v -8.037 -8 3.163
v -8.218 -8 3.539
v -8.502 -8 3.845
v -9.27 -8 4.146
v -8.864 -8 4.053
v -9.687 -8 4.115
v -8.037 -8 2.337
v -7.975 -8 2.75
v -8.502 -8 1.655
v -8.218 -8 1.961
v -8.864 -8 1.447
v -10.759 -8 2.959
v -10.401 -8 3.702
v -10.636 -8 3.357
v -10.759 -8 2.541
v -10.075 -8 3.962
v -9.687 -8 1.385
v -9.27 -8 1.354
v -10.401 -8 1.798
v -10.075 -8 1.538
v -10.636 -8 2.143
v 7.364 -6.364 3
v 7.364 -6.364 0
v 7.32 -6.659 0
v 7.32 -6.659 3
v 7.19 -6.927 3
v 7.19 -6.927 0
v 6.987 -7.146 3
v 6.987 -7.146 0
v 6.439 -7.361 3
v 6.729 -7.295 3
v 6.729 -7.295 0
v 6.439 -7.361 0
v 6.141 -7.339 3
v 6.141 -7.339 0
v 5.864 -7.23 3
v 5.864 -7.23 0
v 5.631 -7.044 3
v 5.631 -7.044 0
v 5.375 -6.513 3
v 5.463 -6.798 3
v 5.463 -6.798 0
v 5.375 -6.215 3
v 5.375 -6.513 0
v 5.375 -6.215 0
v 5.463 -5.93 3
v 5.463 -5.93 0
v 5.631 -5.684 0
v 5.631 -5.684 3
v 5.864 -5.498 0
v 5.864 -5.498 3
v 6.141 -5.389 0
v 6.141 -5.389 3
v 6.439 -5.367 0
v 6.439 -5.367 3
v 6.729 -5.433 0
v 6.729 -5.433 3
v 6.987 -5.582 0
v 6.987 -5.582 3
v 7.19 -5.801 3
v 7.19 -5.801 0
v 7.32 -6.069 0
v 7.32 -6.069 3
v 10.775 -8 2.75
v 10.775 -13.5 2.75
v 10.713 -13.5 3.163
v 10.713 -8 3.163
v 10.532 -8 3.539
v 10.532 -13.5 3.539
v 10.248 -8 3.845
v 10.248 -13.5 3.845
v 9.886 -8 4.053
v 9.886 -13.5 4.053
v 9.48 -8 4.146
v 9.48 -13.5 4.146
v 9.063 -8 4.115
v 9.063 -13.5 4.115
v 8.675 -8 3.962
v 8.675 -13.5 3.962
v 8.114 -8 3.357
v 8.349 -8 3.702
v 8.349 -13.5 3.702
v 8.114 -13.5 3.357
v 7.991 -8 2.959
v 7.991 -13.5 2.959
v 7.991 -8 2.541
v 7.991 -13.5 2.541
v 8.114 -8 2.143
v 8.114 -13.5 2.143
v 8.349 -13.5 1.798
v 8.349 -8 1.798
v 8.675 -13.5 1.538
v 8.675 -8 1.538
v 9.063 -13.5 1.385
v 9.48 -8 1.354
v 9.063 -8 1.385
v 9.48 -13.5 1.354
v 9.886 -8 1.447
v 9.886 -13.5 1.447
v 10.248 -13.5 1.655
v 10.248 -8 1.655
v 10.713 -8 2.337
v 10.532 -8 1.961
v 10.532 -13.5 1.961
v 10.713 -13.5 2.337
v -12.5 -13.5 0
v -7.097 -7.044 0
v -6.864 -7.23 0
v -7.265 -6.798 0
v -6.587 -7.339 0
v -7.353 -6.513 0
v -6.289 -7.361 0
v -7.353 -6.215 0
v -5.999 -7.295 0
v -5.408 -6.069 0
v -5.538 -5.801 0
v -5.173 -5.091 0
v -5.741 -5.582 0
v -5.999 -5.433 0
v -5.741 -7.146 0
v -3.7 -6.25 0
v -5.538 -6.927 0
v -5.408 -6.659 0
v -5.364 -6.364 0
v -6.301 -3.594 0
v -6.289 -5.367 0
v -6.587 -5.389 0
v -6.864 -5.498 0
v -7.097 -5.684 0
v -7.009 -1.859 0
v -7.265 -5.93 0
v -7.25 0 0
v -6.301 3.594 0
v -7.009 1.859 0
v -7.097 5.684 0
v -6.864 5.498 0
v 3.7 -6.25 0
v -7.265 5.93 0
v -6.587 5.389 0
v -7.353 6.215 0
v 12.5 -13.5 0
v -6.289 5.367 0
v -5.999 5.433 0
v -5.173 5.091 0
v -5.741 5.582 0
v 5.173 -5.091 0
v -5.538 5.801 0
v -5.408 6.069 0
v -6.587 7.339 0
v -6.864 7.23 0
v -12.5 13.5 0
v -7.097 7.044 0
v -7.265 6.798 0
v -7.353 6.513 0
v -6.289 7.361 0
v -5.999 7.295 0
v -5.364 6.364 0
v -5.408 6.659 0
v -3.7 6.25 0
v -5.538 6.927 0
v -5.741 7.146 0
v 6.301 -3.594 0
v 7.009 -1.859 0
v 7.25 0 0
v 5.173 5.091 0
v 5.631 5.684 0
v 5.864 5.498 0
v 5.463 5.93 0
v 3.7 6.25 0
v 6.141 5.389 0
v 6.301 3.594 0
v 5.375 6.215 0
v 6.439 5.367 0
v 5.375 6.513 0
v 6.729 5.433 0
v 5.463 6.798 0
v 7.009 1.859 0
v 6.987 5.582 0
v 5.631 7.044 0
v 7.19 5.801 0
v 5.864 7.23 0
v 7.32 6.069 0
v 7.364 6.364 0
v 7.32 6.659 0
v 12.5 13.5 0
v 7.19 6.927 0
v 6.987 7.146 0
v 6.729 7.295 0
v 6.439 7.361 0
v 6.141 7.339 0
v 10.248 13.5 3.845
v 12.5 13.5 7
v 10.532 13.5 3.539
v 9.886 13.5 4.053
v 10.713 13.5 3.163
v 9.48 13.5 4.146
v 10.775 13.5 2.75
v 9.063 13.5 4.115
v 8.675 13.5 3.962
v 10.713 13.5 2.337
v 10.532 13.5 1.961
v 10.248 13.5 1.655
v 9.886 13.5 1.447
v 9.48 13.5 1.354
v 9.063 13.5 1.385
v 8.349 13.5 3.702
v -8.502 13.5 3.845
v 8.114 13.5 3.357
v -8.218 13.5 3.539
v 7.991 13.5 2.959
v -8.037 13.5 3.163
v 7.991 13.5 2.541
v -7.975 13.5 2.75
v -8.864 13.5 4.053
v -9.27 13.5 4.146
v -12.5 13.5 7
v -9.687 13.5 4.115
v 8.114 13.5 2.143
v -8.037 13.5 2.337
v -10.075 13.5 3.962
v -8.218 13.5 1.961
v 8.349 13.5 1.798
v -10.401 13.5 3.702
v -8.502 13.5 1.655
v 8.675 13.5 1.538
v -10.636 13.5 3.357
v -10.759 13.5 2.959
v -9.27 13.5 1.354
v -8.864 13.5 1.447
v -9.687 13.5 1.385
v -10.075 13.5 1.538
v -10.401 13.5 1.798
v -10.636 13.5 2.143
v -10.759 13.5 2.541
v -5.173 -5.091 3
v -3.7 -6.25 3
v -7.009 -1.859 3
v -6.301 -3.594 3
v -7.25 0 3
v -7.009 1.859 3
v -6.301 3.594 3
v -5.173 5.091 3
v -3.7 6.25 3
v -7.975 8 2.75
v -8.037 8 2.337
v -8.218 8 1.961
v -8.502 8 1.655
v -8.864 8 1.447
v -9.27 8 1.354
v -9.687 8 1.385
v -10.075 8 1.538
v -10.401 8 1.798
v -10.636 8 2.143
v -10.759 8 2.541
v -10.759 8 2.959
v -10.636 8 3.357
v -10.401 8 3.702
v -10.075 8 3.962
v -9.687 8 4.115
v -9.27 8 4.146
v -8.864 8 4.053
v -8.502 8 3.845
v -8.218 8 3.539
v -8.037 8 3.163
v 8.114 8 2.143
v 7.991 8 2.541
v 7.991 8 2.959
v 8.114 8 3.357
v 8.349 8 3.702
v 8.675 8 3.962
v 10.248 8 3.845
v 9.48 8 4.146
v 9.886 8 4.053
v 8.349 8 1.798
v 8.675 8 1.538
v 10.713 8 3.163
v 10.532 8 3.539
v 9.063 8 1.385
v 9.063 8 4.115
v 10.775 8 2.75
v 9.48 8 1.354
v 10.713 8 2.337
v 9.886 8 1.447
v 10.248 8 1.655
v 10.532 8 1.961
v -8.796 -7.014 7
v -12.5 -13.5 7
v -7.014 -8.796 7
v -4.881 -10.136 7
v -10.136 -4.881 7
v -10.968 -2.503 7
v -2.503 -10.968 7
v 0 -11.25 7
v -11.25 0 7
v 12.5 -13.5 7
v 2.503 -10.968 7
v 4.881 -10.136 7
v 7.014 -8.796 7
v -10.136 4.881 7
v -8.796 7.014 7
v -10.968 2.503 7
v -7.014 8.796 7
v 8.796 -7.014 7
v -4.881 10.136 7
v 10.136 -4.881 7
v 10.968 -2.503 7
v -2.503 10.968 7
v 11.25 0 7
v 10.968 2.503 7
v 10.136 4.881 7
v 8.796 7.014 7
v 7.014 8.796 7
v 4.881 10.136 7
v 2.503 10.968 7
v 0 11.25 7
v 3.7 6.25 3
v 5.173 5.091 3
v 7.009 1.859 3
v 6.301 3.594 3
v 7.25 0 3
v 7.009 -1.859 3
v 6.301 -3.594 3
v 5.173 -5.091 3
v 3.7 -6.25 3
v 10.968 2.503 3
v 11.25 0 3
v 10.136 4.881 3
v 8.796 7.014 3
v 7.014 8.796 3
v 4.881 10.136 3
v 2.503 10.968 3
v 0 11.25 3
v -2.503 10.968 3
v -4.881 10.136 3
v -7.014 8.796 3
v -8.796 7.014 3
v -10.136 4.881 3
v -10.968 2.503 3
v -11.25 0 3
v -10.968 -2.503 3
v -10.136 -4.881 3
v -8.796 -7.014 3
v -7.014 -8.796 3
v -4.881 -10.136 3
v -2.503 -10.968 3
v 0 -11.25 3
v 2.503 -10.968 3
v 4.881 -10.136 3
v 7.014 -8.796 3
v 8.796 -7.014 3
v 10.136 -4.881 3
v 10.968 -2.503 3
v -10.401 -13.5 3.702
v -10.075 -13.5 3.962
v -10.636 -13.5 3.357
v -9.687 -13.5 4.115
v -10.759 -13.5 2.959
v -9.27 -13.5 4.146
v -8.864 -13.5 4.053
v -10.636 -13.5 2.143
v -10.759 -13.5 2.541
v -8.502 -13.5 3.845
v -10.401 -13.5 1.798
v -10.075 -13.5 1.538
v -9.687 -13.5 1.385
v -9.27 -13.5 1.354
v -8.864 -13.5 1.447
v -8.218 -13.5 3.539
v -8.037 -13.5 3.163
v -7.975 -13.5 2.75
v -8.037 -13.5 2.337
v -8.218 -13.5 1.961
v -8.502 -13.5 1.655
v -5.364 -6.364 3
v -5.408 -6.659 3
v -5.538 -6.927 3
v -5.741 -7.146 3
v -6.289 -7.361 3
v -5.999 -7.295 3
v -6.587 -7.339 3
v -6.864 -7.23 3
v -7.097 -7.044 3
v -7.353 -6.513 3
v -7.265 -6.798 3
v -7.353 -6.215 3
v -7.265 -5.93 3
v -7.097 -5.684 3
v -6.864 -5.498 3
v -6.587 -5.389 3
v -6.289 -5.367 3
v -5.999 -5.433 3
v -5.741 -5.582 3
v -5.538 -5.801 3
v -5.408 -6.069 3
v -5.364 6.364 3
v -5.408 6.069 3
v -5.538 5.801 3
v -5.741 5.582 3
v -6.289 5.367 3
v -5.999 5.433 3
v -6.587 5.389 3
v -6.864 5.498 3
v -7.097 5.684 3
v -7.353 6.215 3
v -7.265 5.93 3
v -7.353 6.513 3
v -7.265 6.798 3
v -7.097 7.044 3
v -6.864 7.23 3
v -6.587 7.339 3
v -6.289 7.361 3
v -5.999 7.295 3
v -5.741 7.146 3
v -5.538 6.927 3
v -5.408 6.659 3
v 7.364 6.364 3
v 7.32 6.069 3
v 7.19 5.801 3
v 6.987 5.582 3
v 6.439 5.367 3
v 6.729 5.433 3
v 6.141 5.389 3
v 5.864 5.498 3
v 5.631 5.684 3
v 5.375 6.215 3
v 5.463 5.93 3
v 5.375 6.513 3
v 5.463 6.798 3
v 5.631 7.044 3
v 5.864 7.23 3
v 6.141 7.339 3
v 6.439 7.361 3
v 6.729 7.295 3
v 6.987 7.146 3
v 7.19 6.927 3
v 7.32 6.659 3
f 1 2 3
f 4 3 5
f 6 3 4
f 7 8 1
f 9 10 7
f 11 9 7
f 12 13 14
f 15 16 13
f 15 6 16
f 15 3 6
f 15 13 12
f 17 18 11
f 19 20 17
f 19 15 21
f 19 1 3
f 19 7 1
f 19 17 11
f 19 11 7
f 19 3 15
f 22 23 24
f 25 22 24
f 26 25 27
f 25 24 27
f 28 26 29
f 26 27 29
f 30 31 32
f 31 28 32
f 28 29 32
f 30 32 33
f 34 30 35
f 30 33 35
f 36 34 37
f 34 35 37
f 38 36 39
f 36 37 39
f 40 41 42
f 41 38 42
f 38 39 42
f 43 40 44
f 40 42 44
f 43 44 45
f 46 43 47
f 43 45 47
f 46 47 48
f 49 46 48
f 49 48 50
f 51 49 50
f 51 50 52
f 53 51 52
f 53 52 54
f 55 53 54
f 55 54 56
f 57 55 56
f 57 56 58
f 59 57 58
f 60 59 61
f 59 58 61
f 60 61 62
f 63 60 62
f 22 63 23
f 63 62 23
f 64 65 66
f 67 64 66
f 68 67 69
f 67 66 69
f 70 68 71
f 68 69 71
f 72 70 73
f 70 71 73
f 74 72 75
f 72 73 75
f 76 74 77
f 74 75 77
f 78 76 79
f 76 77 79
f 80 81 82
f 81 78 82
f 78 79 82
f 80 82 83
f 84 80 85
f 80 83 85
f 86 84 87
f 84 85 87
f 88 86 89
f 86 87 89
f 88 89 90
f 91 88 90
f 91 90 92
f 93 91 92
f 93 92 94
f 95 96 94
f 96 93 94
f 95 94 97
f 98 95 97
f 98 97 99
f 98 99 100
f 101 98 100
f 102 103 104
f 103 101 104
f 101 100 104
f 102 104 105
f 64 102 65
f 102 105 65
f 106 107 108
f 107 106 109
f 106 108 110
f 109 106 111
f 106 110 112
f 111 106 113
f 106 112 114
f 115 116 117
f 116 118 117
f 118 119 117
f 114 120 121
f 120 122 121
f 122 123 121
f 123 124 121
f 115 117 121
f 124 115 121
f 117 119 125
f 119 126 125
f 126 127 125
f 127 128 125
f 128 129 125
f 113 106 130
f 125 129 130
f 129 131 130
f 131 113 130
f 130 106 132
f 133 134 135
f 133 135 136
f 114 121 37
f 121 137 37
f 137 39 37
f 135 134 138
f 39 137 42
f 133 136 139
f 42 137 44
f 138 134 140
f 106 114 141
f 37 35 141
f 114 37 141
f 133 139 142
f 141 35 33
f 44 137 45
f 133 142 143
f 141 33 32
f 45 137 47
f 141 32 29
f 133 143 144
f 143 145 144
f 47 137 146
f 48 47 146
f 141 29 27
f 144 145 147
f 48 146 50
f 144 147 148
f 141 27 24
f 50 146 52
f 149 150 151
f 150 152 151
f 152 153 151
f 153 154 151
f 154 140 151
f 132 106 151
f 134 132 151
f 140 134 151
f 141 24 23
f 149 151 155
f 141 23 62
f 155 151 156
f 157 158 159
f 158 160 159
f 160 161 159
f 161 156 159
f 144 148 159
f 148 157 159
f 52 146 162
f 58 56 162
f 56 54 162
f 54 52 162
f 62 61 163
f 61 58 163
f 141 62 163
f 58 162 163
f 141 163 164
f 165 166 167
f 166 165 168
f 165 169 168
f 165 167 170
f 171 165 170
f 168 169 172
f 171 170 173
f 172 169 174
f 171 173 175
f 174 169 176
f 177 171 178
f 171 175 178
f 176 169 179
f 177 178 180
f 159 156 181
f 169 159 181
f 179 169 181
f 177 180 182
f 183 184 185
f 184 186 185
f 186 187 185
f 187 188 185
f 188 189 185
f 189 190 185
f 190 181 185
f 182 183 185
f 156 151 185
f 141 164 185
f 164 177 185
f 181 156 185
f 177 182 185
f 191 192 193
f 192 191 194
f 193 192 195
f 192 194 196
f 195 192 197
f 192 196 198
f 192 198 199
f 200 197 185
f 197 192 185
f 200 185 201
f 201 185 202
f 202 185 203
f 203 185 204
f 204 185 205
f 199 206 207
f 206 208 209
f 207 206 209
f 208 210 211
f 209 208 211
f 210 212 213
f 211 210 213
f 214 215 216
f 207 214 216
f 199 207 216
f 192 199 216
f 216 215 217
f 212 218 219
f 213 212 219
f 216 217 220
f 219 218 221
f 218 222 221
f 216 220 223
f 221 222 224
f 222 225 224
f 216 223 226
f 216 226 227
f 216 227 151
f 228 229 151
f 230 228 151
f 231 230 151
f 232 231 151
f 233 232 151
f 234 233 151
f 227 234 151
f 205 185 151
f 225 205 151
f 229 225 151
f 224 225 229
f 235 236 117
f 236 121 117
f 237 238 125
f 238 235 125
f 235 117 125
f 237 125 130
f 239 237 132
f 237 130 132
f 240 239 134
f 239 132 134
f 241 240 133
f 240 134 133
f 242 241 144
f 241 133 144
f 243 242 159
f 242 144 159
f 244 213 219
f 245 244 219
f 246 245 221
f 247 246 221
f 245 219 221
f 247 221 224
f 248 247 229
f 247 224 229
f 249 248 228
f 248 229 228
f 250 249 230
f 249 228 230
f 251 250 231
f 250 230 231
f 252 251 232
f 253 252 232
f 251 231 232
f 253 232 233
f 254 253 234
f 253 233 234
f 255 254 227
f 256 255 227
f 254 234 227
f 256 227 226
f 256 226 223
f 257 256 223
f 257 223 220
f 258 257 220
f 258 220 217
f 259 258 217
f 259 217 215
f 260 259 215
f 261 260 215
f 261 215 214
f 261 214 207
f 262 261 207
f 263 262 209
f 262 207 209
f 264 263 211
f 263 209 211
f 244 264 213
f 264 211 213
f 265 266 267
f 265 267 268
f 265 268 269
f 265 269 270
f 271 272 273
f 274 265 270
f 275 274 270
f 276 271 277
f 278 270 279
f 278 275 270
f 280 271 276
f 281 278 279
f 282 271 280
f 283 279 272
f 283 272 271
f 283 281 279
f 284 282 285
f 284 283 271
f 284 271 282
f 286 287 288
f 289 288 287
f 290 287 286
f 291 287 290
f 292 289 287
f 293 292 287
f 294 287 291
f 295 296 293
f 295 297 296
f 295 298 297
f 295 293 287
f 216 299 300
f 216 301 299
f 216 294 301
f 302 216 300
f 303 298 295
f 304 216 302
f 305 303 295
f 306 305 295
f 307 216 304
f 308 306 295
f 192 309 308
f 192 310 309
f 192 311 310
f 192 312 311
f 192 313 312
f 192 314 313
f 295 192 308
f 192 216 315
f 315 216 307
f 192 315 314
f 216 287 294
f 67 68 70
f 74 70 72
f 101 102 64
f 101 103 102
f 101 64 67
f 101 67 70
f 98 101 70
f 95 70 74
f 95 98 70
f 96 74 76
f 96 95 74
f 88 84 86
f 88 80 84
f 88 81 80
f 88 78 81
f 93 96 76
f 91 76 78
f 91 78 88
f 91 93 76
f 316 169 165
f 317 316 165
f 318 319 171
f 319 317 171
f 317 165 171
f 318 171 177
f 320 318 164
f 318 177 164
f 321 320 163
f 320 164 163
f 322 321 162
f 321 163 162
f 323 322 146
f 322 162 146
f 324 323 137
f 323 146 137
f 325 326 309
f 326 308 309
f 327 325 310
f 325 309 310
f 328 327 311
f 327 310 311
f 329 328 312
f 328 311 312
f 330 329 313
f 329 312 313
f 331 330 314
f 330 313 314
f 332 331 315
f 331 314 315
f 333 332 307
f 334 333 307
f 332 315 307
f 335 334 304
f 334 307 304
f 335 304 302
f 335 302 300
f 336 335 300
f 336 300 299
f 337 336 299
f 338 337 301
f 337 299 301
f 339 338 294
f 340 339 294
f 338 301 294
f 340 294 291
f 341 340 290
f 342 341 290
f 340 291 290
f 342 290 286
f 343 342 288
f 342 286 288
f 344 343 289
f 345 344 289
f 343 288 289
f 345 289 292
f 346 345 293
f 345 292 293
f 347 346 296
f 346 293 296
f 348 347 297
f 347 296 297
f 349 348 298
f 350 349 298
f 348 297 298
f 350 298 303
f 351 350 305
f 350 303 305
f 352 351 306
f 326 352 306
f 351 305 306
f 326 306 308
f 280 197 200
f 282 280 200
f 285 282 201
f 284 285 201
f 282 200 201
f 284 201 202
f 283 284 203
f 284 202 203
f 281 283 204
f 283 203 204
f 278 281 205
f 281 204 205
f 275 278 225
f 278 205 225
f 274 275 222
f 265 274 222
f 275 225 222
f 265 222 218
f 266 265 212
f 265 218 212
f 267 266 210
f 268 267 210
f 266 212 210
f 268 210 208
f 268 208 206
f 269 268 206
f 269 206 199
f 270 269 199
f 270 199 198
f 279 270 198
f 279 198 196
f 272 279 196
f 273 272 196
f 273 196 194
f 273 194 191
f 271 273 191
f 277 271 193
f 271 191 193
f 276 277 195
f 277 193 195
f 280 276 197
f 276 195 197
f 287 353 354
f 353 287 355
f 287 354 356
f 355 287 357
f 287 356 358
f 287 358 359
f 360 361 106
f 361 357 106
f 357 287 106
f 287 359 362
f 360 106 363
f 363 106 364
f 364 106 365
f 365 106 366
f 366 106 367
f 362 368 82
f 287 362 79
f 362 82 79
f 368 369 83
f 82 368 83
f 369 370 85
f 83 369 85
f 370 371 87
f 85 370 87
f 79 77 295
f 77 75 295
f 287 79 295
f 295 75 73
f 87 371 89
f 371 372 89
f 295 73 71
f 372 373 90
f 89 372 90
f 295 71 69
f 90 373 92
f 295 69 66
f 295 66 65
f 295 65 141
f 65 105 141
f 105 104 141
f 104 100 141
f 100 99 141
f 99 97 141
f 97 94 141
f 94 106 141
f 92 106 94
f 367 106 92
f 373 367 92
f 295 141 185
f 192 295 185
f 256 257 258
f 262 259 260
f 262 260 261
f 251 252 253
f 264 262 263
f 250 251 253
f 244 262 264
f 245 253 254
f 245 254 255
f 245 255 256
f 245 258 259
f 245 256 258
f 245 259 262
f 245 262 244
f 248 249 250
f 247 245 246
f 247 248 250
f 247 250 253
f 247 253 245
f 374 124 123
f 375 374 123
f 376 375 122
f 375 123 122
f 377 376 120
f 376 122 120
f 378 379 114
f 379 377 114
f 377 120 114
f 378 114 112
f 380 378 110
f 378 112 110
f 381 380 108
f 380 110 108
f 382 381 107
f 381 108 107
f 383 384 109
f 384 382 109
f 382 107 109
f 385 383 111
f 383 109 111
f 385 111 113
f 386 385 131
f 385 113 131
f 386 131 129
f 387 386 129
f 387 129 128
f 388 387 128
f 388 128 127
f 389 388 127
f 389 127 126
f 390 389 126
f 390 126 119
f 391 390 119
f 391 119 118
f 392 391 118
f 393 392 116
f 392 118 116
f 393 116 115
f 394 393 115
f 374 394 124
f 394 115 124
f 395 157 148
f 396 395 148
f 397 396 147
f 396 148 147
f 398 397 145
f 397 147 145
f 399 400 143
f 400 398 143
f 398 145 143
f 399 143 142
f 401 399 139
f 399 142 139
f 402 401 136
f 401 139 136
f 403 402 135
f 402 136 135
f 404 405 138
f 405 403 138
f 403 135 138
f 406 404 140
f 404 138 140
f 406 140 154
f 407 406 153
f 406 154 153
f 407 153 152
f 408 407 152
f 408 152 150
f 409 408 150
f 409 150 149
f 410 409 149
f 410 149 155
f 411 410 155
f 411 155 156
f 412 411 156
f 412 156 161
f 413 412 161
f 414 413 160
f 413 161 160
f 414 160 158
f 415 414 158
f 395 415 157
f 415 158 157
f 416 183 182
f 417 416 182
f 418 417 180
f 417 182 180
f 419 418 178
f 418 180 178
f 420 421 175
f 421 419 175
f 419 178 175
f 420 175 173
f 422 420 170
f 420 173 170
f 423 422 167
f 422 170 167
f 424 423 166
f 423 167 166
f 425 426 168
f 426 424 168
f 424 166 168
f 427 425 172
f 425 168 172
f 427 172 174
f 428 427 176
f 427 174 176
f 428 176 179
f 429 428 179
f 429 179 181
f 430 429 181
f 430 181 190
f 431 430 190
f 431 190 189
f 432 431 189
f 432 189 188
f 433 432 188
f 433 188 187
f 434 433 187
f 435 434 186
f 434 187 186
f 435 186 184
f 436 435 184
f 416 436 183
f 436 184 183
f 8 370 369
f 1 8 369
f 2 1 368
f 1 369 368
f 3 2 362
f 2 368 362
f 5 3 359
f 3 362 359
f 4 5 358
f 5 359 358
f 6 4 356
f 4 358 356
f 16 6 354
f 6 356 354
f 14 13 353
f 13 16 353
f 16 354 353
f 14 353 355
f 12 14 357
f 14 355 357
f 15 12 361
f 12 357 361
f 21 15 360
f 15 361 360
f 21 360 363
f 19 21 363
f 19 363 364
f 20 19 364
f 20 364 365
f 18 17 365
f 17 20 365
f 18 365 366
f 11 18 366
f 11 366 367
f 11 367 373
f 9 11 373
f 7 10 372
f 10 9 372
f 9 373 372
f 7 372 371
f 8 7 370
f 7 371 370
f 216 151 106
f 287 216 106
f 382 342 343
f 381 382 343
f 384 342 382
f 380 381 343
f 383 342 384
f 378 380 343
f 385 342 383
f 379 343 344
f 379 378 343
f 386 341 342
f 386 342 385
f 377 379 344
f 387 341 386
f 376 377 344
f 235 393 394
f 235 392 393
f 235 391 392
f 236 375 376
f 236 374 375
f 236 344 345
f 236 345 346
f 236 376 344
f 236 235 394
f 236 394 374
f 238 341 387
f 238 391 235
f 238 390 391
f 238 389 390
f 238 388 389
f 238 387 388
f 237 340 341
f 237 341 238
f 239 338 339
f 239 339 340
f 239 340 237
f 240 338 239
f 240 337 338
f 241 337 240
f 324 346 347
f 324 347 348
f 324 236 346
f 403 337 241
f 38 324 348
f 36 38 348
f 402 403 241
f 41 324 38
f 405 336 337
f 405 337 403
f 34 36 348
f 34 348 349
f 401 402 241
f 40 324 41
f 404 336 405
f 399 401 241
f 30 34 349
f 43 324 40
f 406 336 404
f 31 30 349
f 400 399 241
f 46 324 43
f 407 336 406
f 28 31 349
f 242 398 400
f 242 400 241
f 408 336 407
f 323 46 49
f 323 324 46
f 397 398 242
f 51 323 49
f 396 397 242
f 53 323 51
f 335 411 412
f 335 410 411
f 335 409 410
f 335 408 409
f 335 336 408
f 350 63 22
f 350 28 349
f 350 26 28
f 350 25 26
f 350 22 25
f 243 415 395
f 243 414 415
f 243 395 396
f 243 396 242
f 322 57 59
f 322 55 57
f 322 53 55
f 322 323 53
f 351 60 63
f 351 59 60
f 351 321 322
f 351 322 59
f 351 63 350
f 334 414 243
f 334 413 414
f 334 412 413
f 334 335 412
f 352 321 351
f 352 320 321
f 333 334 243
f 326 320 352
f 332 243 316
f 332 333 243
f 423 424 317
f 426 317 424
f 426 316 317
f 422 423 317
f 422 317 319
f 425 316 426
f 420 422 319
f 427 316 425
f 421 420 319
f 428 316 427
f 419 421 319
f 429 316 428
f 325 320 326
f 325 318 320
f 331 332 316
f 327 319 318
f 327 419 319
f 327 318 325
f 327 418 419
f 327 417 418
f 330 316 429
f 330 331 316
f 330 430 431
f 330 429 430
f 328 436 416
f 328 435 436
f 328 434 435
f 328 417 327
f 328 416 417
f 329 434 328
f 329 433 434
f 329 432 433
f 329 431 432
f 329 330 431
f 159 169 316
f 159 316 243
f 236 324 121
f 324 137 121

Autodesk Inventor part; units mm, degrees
ref_plane "YZ Plane" through (0, 0, 0) normal (1, 0, 0) x (0, 1, 0)
ref_plane "XZ Plane" through (0, 0, 0) normal (0, 1, 0) x (-1, 0, 0)
ref_plane "XY Plane" through (0, 0, 0) normal (0, 0, 1) x (1, 0, 0)
sketch "Sketch1" plane through (0, 0, 0) normal (0, 0, 1) x (1, 0, 0)
  circle A0 centre (-6.364, 6.364) radius 1
  circle A1 centre (6.364, 6.364) radius 1
  circle A2 centre (6.364, -6.364) radius 1
  circle A3 centre (-6.364, -6.364) radius 1
  line L0 (-12.5, 13.5) -> (12.5, 13.5)
  line L1 (12.5, 13.5) -> (12.5, -13.5)
  line L2 (12.5, -13.5) -> (-12.5, -13.5)
  line L3 (-12.5, -13.5) -> (-12.5, 13.5)
  line L4 (0, 13.5) -> (-9.375, 13.5) construction
  line L5 (0, 6) -> (0, -6) construction
  line L6 (0, 6) -> (0, 6.25) construction
  line L7 (0, -6) -> (0, -6.25) construction
  line L8 (3.9, -6.25) -> (-8.1, -6.25) construction
  line L9 (4.1, 6.25) -> (-8.9, 6.25) construction
  line L10 (0, 6) -> (3.6056, 6) construction
  line L11 (0, 6.25) -> (3.7, 6.25) construction
  line L12 (3.7, 6.25) -> (-3.7, 6.25)
  line L13 (3.7, -6.25) -> (-3.7, -6.25)
  line L14 (0, 0) -> (7.25, 0) construction
  line L15 (0, 0) -> (-7.25, 0)
  arc A4 (-3.7, 6.25) -> (-3.7, -6.25) centre (0.0268, 0) ccw
  arc A5 (3.7, -6.25) -> (3.7, 6.25) centre (-0.0268, 0) ccw
  point P0 (12.5, 0)
  point P1 (0, -6.25)
  dimension "d0" = 27
  dimension "d1" = 25
  dimension "d2" = 9.375
  dimension "d3" = 12
  dimension "d4" = 0.25
  dimension "d5" = 0.25
  dimension "d6" = 3.6056
  dimension "d7" = 3.7
  dimension "d8" = 7.4
  dimension "d10" = 7.4
  dimension "d11" = 7.25
  dimension "d25" = 7.25
extrude "Extrusion1" add sketch "Sketch1" along normal blind 3
sketch "Sketch2" plane through (0, 0, 3) normal (0, 0, 1) x (1, 0, 0)
  line L0 (3.7, -6.25) -> (-3.7, -6.25) projected
  line L1 (-3.7, 6.25) -> (3.7, 6.25) projected
  circle A0 centre (-6.364, -6.364) radius 1 projected
  circle A1 centre (6.364, -6.364) radius 1 projected
  circle A2 centre (6.364, 6.364) radius 1 projected
  circle A3 centre (-6.364, 6.364) radius 1 projected
  line L2 (12.5, 13.5) -> (-12.5, 13.5) projected
  line L3 (-12.5, 13.5) -> (-12.5, -13.5) projected
  line L4 (-12.5, -13.5) -> (12.5, -13.5) projected
  line L5 (12.5, -13.5) -> (12.5, 13.5) projected
  circle A4 centre (0, 0) radius 11
  arc A5 (3.7, -6.25) -> (3.7, 6.25) centre (-0.0268, 0) ccw projected
  arc A6 (-3.7, 6.25) -> (-3.7, -6.25) centre (0.0268, 0) ccw projected
  dimension "d14" = 22
extrude "Extrusion2" add sketch "Sketch2" along normal blind 2.5 contours L5 L4 L3 L2
sketch "Sketch3" plane through (-12.5, 13.5, 0) normal (0, 1, 0) x (1, 0, 0)
  line L0 (0, 0) -> (25, 0) projected
  line L1 (0, 0) -> (0, -5.5) projected
  line L2 (25, -5.5) -> (0, -5.5) projected
  line L3 (25, 0) -> (25, -5.5) projected
  line L4 (12.5, 0) -> (12.5, -5.5) construction
  line L5 (25, -5.5) -> (0, -5.5) construction
  line L6 (12.5, 0) -> (12.5, -2.75) construction
  line L7 (12.5, -2.75) -> (3.125, -2.75) construction
  line L8 (12.5, -2.75) -> (21.875, -2.75) construction
  circle A0 centre (3.125, -2.75) radius 1.4
  circle A1 centre (21.875, -2.75) radius 1.4
  dimension "d17" = 2.75
  dimension "d18" = 9.375
  dimension "d19" = 180
  dimension "d20" = 2.8
  dimension "d21" = 2.8
extrude "Extrusion3" cut sketch "Sketch3" against normal blind 5.5 contours A0 | A1
mirror "Mirror1" about plane through (0, 0, 0) normal (0, 1, 0) of "Extrusion3"
sketch "Sketch4" plane through (0, 0, 5.5) normal (0, 0, 1) x (1, 0, 0)
  circle A0 centre (0, 0) radius 11 projected
  line L0 (12.5, 13.5) -> (-12.5, 13.5) projected
  line L1 (-12.5, 13.5) -> (-12.5, -13.5) projected
  line L2 (-12.5, -13.5) -> (12.5, -13.5) projected
  line L3 (12.5, -13.5) -> (12.5, 13.5) projected
extrude "Extrusion4" add sketch "Sketch4" along normal blind 1.5
sketch "Sketch5" plane through (0, 0, 7) normal (0, 0, 1) x (1, 0, 0)
  circle A0 centre (0, 0) radius 11.25
  circle A1 centre (0, 0) radius 11 projected
  dimension "d28" = 22.5
extrude "Extrusion5" cut sketch "Sketch5" against normal up to surface (4 mm away)
properties part number "MotorMountv2"
